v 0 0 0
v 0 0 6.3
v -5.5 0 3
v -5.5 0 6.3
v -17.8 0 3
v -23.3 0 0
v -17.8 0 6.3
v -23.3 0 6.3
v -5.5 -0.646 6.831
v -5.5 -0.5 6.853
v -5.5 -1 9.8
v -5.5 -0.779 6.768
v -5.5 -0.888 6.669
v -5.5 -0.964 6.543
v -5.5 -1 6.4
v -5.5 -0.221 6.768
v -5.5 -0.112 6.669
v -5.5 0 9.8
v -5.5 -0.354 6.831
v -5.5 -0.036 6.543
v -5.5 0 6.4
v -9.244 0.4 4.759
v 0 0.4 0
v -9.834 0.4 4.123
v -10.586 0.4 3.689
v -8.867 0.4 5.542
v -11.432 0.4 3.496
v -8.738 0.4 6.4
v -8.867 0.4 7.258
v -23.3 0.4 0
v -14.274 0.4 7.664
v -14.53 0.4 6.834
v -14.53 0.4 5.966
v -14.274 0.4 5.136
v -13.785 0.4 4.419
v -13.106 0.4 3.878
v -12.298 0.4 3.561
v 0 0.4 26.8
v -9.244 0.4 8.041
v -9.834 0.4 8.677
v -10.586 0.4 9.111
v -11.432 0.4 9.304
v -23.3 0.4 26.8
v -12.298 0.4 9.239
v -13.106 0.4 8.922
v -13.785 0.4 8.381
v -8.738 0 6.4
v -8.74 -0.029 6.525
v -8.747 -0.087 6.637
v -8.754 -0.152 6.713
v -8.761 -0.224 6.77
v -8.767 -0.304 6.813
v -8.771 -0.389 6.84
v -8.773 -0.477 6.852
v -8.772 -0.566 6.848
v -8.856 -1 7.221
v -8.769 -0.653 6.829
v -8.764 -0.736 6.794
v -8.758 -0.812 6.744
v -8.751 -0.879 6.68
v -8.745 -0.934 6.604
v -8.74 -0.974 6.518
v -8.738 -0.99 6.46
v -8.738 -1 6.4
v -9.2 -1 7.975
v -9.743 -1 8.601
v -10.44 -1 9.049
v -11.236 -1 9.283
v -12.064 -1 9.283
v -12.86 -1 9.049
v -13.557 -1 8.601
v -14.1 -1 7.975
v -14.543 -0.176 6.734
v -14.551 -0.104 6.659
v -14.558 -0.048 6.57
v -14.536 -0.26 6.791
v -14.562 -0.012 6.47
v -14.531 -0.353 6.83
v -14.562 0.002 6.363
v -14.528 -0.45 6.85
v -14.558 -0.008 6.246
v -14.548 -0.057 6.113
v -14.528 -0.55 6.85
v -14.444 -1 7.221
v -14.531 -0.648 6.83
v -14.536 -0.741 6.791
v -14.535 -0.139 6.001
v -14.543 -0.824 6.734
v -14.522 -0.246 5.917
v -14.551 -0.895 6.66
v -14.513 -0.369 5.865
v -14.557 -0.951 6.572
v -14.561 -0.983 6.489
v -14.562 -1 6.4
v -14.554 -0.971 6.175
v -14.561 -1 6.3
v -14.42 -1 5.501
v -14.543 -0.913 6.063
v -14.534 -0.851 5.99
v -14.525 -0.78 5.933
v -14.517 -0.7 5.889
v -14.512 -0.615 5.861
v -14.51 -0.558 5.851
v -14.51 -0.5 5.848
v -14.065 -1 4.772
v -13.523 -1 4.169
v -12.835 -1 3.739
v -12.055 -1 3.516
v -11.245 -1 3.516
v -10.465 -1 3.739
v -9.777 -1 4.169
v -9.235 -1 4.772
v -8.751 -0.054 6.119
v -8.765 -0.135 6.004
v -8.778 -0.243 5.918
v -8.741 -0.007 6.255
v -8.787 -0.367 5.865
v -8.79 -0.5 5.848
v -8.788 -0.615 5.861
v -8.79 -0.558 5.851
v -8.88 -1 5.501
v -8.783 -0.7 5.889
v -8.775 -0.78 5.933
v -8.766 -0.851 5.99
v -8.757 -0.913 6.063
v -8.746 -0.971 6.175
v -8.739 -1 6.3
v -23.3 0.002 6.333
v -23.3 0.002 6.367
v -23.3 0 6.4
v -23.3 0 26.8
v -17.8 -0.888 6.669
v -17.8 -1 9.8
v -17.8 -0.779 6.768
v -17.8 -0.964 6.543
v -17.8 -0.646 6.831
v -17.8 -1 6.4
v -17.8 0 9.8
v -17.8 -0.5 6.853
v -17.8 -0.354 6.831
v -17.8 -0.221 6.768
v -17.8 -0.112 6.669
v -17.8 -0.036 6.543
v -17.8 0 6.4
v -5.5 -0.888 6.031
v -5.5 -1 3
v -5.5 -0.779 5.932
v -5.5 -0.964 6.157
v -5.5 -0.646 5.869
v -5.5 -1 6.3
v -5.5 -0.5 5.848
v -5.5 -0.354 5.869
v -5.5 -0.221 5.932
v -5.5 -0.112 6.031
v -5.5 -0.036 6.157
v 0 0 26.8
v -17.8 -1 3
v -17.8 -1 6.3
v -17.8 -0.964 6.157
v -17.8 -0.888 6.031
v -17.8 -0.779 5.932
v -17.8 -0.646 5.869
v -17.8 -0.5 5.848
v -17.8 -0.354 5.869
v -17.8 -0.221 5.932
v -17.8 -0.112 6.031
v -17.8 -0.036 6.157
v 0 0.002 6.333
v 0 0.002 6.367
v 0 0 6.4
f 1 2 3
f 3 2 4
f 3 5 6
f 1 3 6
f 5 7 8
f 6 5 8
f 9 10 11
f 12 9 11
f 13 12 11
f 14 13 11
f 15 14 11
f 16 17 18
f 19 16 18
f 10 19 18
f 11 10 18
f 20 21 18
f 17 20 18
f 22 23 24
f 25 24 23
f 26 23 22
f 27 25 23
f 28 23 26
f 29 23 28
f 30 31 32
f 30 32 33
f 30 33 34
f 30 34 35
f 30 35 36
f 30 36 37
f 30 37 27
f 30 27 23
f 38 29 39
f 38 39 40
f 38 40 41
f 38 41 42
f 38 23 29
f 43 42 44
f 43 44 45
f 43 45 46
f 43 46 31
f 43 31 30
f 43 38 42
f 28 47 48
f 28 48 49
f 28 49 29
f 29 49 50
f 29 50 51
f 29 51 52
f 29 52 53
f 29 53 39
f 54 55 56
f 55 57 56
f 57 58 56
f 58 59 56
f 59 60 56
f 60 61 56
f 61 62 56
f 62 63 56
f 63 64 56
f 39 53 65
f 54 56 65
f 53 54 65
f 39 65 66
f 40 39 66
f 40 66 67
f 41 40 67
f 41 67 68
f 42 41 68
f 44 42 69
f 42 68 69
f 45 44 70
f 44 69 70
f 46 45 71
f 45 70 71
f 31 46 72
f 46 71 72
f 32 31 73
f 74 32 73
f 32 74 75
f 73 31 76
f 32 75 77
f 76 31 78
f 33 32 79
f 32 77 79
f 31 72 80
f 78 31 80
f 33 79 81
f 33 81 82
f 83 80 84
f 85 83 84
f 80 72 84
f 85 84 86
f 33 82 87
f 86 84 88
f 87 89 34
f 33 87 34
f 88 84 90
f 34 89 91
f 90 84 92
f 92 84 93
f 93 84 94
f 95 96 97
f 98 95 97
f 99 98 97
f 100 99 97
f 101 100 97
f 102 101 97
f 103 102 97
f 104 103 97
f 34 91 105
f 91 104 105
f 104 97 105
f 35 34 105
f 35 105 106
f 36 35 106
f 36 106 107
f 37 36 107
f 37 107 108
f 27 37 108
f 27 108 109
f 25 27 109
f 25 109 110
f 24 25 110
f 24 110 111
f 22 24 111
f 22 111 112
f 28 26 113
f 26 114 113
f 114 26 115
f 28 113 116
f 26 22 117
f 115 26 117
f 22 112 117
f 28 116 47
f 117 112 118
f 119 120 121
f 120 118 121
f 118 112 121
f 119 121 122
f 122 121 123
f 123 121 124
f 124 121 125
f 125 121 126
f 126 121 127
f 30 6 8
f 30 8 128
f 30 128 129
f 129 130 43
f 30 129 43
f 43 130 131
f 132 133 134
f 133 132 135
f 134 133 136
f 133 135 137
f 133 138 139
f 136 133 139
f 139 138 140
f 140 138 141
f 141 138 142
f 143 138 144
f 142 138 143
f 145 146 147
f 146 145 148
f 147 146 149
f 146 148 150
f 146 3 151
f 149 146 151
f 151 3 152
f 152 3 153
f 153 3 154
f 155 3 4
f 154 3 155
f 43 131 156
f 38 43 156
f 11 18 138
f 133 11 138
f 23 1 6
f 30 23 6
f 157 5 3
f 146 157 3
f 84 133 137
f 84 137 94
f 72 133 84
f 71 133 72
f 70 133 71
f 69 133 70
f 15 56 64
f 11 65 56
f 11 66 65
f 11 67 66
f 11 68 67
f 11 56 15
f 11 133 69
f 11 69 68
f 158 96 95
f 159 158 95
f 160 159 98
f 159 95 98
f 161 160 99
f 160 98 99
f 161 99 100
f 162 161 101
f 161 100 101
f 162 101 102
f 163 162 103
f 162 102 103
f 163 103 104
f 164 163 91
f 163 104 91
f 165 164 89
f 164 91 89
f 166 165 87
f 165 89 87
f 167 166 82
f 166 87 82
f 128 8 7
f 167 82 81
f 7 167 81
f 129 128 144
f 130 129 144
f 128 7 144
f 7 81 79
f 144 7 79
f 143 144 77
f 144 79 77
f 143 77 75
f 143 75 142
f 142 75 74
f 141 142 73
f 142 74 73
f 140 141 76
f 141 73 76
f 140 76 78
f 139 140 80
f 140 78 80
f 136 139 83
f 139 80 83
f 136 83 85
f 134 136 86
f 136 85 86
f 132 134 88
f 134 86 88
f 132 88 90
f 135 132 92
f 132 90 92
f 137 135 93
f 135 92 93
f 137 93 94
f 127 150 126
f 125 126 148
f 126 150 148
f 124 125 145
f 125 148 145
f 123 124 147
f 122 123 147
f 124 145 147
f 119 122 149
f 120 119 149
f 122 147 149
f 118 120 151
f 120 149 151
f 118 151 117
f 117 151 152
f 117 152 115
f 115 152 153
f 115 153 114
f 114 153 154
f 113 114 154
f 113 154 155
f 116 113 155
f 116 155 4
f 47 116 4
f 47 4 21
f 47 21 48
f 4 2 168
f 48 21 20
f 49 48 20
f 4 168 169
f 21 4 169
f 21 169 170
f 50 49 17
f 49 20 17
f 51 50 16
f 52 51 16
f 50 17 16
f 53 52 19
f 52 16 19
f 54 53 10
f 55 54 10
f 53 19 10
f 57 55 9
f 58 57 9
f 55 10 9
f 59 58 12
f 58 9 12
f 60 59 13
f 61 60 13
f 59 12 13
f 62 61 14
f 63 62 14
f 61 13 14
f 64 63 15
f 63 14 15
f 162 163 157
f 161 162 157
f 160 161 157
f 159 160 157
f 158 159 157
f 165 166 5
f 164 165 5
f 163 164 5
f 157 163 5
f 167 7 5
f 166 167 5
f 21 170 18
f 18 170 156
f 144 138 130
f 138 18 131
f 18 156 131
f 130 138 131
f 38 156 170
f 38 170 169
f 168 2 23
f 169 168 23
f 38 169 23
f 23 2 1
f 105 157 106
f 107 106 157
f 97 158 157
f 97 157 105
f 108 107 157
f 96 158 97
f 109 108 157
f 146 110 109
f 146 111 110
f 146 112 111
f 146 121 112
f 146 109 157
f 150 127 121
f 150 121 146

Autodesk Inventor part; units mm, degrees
ref_plane "YZ Plane" through (0, 0, 0) normal (1, 0, 0) x (0, 1, 0)
ref_plane "XZ Plane" through (0, 0, 0) normal (0, 1, 0) x (-1, 0, 0)
ref_plane "XY Plane" through (0, 0, 0) normal (0, 0, 1) x (1, 0, 0)
sketch "Skizze1" plane through (0, 0, 0) normal (0, 1, 0) x (-1, 0, 0)
  line L0 (0, 0) -> (23.3, 0)
  line L1 (23.3, 0) -> (23.3, 26.8)
  line L2 (23.3, 26.8) -> (0, 26.8)
  line L3 (0, 26.8) -> (0, 0)
  dimension "d0" = 23.3
  dimension "d1" = 26.8
extrude "Extrusion1" add sketch "Skizze1" along normal blind 0.4
sketch "Skizze2" plane through (0, 0, 0) normal (0, -1, 0) x (1, 0, 0)
  line L0 (0, 0) -> (-23.3, 0) projected
  line L1 (0, 26.8) -> (0, 0) projected
  line L2 (-23.3, 26.8) -> (0, 26.8) projected
  line L3 (-23.3, 0) -> (-23.3, 26.8) projected
  line L4 (-17.8, 3) -> (-5.5, 3)
  line L5 (-5.5, 3) -> (-5.5, 9.8)
  line L6 (-5.5, 9.8) -> (-17.8, 9.8)
  line L7 (-17.8, 9.8) -> (-17.8, 3)
  dimension "d4" = 3
  dimension "d5" = 17
  dimension "d6" = 5.5
  dimension "d7" = 5.5
extrude "Extrusion2" add sketch "Skizze2" along normal blind 1 contours L7 L6 L5 L4
sketch "Skizze3" plane through (0, -1, 0) normal (0, -1, 0) x (1, 0, 0)
  line L0 (-17.8, 3) -> (-5.5, 3) projected
  line L1 (-5.5, 3) -> (-5.5, 9.8) projected
  line L2 (-5.5, 9.8) -> (-17.8, 9.8) projected
  line L3 (-17.8, 9.8) -> (-17.8, 3) projected
  circle A0 centre (-11.65, 6.4) radius 2.9125
  point P0 (0, 0)
extrude "Extrusion3" cut sketch "Skizze3" against normal through all contours A0
ref_plane "Work Plane1" through (-11.65, 0, 0) normal (-1, 0, 0) x (0, 0, 1)
sketch "Sketch5" plane through (0, 0, 26.8) normal (1, 0, 0) x (0, 0, -1)
  line L0 (23.3125, -1) -> (23.3125, 0.4) projected
  line L1 (17.4875, -1) -> (17.4875, 0.4) projected
  circle A0 centre (20.4499, -0.5) radius 0.5025
  point P0 (26.8, 0)
extrude "Extrusion5" cut sketch "Sketch5" against normal through all
ref_plane "Work Plane3" through (-52.1328, -19.1011, -24.6499) normal (0, 1, 0) x (1, 0, 0)
sketch "Sketch6" plane through (-52.1328, -19.1011, -24.6499) normal (0, 1, 0) x (1, 0, 0)
  line L0 (46.6328, -31.0499) -> (52.1328, -31.0499) construction
  line L1 (52.1328, -51.4499) -> (52.1328, -31.0499) construction
  line L2 (28.8328, -51.4499) -> (52.1328, -51.4499) construction
  line L3 (28.8328, -31.0499) -> (28.8328, -51.4499) construction
  line L4 (28.8328, -31.0499) -> (34.3328, -31.0499) construction
  line L5 (34.3328, -31.0499) -> (34.3328, -34.4499) construction
  line L6 (34.3328, -34.4499) -> (46.6328, -34.4499) construction
  line L7 (46.6328, -34.4499) -> (46.6328, -31.0499) construction
  line L8 (6.9828, -36.0499) -> (6.9828, 22.8301) construction
  line L9 (46.6328, -31.5025) -> (34.3328, -31.5025) construction
  line L10 (-16.7355, -31.5025) -> (-33.6581, -41.2728) construction
  line L11 (-33.6581, -41.2728) -> (-33.6581, -21.7322) construction
  line L12 (-33.6581, -21.7322) -> (-16.7355, -31.5025) construction
  point P0 (52.1328, -24.6499)
  point P1 (-28.0172, -31.5025)
  dimension "d16" = 35
hole "Hole1" at (-85.7909, -19.1011, 16.6229) at (-68.8683, -19.1011, 6.8526) at (-85.7909, -19.1011, -2.9177) direction (0, -1, 0) diameter 3.3 depth 12 tip angle 118 counterbore diameter 8 counterbore depth 4
properties part number "02_Nanoscopy_Chip"
